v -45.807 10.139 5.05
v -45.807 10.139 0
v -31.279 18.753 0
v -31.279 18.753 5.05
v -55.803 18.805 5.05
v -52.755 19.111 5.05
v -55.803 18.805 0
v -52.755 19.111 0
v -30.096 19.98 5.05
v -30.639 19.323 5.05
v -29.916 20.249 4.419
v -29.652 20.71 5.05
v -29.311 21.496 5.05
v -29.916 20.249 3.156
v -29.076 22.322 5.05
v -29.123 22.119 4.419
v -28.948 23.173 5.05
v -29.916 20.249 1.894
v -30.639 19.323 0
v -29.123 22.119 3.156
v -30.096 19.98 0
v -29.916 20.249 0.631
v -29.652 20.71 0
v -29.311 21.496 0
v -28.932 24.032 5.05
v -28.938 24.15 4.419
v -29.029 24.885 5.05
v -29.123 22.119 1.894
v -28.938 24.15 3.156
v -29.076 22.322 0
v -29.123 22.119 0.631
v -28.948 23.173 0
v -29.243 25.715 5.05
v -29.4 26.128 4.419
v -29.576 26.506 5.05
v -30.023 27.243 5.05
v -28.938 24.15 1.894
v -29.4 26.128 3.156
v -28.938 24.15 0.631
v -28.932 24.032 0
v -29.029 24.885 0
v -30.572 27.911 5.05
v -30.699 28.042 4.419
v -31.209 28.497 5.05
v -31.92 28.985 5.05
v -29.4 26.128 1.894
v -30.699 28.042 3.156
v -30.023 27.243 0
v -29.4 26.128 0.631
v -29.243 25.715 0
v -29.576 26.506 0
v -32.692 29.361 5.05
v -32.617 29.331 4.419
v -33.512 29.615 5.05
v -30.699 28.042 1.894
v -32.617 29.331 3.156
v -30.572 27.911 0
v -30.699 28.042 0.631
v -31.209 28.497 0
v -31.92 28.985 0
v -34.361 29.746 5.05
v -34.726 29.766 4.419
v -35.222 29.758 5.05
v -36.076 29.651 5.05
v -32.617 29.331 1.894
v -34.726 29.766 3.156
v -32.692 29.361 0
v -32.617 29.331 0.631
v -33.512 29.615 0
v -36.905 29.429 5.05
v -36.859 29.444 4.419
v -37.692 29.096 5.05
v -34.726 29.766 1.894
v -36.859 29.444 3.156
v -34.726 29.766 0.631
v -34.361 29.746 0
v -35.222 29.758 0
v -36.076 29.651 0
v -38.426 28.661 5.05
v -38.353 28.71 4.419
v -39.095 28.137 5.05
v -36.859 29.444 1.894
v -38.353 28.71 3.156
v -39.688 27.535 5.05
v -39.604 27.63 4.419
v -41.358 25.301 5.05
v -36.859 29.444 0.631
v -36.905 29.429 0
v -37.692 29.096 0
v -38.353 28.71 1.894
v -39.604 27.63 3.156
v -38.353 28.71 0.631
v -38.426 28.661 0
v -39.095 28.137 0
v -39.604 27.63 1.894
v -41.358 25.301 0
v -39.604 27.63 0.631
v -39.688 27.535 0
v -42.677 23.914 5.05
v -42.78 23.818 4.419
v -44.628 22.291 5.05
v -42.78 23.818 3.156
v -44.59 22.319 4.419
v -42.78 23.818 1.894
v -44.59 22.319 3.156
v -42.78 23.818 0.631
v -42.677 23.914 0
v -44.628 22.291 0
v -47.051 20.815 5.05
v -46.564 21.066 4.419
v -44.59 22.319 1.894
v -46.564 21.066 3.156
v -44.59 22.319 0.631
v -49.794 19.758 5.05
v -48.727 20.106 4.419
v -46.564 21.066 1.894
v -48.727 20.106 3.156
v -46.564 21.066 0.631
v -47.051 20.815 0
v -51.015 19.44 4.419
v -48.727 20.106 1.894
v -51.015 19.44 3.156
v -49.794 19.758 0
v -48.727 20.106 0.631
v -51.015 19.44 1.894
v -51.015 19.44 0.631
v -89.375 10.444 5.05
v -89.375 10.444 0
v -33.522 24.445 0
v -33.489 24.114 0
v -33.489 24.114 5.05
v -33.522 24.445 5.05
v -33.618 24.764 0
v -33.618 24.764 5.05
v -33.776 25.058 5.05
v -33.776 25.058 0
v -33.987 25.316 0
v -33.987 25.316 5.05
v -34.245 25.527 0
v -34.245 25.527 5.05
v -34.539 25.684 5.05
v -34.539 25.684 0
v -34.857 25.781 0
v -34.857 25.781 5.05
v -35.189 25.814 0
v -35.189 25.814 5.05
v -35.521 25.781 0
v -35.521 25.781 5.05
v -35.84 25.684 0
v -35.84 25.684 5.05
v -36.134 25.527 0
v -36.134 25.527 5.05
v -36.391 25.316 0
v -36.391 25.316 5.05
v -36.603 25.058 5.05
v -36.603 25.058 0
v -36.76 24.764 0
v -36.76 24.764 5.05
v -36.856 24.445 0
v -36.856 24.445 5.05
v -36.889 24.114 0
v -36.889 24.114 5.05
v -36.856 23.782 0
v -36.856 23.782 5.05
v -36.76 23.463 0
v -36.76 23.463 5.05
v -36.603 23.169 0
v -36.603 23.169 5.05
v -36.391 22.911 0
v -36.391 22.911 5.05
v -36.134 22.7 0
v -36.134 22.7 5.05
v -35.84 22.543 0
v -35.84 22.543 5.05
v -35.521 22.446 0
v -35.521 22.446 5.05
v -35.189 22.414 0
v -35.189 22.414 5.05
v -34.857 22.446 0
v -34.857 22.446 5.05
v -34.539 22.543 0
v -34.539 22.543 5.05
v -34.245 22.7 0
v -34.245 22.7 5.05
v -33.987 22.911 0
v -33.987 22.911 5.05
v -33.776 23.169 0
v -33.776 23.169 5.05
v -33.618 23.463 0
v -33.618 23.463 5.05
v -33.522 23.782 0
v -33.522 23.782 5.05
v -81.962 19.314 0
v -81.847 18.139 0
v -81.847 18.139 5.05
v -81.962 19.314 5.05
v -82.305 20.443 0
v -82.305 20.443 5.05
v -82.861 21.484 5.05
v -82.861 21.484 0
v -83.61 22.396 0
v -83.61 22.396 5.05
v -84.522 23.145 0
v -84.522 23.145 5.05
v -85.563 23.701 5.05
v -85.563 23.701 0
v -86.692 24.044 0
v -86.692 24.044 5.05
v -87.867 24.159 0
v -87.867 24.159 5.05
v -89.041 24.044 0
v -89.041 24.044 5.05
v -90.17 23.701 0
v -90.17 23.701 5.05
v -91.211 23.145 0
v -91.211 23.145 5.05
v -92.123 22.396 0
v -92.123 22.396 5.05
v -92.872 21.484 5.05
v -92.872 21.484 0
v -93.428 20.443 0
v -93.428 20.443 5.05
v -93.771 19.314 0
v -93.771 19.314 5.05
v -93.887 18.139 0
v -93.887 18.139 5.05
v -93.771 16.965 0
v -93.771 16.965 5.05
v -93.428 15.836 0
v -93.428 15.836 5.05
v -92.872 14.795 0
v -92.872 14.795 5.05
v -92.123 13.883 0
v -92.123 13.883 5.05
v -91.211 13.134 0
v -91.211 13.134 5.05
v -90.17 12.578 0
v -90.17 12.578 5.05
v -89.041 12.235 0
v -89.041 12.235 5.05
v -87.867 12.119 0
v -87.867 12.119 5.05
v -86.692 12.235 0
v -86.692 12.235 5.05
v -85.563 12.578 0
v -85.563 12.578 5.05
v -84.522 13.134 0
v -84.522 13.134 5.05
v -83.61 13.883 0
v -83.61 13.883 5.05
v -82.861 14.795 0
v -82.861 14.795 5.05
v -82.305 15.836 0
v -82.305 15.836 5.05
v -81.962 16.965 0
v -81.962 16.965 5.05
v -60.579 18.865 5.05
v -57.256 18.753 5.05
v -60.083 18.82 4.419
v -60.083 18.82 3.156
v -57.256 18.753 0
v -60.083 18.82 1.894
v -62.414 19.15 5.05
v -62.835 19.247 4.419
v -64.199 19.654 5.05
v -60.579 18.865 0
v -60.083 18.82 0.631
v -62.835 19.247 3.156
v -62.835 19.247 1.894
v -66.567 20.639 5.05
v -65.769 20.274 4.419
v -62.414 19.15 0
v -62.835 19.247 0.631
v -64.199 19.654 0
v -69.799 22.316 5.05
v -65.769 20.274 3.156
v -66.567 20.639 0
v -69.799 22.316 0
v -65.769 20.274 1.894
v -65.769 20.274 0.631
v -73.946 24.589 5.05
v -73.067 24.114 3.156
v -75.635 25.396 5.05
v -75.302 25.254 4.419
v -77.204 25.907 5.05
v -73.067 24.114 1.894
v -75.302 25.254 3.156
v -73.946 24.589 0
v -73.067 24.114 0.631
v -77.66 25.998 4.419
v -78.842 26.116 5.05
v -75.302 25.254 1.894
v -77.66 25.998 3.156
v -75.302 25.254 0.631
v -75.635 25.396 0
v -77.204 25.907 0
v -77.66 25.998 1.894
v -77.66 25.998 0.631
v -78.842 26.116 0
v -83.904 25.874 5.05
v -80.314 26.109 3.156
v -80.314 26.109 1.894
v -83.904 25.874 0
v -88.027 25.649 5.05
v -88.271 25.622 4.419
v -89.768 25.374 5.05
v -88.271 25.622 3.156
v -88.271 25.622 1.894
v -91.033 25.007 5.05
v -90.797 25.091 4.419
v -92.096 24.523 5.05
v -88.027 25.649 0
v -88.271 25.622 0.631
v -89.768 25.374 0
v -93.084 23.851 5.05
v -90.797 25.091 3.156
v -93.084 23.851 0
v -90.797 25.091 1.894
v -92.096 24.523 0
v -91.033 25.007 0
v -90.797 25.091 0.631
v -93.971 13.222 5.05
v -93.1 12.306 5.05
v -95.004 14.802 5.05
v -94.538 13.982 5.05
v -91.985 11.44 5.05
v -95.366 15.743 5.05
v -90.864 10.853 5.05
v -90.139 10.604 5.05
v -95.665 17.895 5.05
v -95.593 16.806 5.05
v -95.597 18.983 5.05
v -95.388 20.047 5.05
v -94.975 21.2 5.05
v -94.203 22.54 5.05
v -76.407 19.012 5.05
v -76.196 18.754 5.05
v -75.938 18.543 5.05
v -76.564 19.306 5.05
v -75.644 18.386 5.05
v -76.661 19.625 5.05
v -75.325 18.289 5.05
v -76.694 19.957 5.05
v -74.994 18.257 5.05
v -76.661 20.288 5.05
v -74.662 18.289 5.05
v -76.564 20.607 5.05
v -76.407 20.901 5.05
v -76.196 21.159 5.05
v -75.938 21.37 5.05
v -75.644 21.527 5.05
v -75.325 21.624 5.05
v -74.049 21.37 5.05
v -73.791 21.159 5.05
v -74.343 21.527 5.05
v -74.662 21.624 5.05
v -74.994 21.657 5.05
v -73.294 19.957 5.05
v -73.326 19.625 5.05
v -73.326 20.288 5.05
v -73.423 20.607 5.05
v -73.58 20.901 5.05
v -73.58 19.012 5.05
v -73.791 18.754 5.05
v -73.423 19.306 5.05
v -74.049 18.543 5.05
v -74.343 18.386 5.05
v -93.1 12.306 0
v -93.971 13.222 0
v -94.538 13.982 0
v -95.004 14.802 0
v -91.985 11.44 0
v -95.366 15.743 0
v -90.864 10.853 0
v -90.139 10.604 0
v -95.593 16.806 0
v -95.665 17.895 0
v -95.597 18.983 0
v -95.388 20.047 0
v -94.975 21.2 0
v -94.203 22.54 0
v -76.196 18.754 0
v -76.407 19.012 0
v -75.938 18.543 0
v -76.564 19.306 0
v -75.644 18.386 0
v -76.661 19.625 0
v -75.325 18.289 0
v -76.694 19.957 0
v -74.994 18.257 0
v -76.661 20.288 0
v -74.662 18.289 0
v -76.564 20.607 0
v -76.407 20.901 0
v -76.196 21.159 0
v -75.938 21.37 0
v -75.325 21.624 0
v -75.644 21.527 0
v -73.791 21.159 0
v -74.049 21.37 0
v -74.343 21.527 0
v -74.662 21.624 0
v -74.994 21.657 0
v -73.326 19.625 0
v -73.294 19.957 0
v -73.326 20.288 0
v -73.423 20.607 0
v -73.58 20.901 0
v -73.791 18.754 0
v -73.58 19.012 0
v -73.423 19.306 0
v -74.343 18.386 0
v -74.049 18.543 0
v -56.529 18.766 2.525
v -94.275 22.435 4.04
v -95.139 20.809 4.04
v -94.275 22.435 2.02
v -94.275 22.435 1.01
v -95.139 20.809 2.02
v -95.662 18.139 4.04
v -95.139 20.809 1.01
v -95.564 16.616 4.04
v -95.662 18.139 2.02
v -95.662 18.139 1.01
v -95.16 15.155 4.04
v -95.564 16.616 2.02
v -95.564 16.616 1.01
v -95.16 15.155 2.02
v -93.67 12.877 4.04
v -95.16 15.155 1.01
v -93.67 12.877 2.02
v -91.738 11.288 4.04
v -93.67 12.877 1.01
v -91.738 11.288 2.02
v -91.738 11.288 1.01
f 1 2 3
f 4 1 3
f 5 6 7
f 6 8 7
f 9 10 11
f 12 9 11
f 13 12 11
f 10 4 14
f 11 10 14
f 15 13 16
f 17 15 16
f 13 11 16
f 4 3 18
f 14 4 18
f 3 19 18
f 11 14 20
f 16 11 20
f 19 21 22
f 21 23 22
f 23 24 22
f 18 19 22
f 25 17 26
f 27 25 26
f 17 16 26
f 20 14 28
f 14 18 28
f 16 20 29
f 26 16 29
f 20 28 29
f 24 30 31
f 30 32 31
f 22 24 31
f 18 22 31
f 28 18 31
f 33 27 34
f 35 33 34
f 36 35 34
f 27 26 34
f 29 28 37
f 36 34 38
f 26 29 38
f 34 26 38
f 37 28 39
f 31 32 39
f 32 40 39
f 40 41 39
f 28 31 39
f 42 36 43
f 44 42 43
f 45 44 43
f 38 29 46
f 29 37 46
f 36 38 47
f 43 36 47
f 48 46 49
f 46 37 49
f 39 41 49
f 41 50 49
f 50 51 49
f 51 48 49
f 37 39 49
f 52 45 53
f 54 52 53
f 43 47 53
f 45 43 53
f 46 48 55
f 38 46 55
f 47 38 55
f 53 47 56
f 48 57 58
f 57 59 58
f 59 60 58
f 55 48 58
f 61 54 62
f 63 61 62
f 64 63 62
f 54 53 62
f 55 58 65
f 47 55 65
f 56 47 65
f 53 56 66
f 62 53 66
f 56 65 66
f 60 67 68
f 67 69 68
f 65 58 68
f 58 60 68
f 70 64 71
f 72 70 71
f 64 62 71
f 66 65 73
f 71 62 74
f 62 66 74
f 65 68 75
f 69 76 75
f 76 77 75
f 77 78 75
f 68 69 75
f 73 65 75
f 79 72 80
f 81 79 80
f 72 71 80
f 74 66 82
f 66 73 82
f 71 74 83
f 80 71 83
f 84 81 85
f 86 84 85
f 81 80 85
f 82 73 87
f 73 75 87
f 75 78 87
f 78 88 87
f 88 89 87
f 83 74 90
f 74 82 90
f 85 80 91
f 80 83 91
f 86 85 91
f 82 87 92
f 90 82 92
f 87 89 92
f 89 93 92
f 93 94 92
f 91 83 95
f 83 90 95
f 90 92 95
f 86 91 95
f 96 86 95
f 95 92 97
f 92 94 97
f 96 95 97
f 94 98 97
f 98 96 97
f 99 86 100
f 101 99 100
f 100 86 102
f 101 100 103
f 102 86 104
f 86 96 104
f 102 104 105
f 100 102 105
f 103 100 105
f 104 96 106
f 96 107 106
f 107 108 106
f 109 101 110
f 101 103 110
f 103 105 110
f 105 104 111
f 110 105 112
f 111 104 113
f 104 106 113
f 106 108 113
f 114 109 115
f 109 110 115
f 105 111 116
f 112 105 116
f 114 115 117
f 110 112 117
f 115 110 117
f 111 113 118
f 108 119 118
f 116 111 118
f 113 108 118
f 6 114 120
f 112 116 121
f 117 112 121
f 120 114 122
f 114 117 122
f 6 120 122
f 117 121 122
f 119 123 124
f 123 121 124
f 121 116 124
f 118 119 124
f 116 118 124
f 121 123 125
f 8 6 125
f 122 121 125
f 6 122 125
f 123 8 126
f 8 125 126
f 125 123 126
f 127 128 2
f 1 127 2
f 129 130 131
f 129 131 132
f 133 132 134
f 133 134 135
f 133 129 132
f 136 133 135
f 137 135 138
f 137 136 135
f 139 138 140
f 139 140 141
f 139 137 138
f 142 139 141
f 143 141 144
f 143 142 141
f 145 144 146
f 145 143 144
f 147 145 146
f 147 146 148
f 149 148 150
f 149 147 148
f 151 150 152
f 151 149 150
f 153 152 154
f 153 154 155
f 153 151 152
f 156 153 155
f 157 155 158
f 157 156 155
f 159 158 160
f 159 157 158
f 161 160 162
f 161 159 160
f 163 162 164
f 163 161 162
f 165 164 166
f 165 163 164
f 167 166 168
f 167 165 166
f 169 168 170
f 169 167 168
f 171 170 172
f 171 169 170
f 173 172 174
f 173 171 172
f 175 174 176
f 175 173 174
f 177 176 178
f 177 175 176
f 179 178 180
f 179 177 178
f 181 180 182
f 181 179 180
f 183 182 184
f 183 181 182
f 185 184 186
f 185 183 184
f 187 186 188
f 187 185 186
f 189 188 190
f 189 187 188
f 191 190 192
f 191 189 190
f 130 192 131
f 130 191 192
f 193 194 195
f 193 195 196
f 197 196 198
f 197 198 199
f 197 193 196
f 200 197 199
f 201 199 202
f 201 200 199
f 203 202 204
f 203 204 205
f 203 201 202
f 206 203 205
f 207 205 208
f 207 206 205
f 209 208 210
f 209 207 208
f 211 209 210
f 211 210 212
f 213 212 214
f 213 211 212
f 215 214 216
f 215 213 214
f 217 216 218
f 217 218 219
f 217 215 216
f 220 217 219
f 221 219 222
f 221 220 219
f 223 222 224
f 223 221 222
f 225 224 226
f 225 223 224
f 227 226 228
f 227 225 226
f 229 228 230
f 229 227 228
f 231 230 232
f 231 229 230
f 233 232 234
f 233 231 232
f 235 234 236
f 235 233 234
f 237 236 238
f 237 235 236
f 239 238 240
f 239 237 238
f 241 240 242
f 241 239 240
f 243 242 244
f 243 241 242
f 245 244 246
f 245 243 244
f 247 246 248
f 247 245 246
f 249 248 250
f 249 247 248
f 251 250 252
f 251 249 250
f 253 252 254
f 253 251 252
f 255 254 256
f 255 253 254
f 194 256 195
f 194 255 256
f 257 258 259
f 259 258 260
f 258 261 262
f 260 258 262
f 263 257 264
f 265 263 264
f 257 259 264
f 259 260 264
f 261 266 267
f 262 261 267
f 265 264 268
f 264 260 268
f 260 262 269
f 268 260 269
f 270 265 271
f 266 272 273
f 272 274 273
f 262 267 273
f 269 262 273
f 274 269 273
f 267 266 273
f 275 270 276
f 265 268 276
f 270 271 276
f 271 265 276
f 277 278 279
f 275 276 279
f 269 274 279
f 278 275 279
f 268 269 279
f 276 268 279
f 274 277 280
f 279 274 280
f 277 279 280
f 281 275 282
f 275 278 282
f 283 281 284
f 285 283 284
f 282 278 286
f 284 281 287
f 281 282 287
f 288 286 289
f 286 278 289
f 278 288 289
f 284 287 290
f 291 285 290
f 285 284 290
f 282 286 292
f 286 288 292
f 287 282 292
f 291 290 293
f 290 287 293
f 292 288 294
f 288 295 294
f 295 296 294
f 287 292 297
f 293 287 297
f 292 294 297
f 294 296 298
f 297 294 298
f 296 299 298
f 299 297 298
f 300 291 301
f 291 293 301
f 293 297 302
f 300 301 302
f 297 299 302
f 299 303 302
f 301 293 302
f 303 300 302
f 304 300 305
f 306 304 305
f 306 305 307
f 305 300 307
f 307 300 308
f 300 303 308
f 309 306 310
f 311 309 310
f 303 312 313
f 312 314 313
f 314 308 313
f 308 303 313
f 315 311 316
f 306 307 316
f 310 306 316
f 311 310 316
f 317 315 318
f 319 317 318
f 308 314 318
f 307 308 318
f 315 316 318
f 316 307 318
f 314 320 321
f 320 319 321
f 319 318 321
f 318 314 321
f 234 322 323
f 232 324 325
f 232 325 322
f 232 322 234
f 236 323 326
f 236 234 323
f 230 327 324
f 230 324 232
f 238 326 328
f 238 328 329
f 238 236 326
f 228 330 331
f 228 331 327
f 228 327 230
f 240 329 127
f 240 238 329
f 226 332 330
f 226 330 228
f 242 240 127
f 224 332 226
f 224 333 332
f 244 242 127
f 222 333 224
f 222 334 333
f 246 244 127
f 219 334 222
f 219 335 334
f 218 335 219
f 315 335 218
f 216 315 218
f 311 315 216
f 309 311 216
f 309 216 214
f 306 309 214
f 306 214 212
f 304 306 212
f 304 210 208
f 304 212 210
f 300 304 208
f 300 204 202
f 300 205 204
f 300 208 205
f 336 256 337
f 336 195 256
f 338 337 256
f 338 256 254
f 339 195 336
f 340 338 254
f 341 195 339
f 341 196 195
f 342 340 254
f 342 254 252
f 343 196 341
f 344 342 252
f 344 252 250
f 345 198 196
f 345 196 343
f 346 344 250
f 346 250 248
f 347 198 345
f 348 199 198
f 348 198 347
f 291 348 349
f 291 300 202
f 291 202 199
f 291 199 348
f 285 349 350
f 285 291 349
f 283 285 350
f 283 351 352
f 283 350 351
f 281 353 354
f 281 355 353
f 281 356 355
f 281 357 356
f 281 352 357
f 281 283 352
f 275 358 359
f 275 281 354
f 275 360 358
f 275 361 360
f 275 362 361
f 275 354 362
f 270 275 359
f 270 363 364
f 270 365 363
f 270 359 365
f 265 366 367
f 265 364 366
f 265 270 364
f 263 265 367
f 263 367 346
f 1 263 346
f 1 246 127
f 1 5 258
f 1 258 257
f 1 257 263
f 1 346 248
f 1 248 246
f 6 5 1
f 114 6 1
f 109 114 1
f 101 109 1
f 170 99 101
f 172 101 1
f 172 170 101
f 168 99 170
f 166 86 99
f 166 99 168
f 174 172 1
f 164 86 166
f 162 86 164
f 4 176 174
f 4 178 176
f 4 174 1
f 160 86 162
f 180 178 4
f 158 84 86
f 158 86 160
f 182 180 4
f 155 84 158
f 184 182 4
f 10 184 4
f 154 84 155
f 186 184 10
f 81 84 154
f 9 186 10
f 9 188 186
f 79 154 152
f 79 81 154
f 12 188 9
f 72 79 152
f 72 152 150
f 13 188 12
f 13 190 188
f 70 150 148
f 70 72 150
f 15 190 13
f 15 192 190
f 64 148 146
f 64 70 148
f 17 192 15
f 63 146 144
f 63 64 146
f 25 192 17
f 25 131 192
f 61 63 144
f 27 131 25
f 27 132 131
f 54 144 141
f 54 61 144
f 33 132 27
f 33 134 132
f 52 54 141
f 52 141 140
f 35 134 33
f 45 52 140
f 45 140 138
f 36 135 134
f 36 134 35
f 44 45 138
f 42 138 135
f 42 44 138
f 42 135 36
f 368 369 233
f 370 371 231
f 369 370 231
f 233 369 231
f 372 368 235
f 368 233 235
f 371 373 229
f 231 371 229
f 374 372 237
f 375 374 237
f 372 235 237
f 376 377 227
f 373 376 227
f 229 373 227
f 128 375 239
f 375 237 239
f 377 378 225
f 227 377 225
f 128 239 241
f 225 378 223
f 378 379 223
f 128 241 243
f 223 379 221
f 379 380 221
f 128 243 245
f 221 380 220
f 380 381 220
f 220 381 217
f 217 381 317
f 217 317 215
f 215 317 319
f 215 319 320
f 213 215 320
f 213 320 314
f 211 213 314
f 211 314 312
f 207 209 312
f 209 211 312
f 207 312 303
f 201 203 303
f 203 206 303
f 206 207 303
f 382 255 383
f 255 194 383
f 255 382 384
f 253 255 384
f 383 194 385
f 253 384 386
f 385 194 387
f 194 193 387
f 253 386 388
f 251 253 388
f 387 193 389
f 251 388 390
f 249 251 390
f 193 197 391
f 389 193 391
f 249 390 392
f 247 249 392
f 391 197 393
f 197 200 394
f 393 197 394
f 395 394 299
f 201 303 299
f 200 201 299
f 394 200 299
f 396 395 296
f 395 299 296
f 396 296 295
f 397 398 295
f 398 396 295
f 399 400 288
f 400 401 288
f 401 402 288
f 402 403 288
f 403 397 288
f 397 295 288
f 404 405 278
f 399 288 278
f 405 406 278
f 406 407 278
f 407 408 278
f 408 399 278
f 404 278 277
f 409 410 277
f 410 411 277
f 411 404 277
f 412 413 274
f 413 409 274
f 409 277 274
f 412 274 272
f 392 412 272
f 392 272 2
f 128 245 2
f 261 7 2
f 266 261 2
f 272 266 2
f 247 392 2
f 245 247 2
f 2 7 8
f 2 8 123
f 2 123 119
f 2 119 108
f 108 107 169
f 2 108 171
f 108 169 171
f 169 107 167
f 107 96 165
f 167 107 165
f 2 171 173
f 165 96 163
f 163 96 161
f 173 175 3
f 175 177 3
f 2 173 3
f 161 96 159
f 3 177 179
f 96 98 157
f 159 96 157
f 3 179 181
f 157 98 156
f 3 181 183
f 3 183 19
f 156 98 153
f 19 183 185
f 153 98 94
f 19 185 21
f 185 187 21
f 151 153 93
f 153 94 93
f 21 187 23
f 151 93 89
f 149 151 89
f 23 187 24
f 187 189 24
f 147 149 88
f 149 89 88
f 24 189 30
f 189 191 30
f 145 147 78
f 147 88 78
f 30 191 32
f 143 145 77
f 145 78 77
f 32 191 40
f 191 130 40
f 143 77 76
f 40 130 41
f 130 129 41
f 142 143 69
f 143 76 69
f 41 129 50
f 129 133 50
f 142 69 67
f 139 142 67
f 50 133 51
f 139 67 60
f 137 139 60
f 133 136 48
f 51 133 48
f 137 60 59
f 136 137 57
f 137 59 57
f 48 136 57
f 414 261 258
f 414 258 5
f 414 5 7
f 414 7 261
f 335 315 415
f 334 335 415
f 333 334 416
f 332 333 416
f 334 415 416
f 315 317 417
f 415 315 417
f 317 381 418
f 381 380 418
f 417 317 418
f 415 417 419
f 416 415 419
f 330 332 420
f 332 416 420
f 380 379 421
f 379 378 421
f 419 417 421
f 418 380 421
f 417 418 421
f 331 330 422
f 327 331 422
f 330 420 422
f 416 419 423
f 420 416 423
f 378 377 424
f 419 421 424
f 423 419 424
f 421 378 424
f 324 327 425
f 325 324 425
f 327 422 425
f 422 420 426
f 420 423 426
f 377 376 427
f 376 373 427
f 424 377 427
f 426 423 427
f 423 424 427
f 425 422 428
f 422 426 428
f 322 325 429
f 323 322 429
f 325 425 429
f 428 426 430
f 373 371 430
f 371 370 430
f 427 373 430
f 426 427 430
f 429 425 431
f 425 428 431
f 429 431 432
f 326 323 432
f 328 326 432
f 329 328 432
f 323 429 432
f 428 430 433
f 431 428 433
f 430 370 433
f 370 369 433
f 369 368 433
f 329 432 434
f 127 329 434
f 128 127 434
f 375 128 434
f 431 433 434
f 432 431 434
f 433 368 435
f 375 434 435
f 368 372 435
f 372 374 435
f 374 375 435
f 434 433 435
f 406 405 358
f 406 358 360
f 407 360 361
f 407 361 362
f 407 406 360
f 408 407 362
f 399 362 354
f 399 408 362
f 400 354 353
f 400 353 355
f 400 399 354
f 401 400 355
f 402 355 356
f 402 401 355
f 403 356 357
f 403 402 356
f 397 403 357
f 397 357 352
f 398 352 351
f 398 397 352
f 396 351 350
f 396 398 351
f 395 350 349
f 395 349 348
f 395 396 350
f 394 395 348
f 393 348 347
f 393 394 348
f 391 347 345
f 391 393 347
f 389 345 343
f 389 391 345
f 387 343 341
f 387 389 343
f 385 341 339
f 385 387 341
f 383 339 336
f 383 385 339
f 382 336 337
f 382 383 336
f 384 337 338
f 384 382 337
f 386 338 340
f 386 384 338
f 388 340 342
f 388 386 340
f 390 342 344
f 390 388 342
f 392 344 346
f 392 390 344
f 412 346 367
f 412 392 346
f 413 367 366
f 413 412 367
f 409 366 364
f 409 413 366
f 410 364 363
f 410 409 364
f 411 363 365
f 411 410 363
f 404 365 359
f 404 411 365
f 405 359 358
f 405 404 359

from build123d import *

# Parameters (mm, degrees)
SCHIZZO2_R                   = 6.02
SCHIZZO2_R_2                 = 1.7
ESTRUSIONE_ESTRUSIONE1_DEPTH = 5.05


with BuildPart() as part:
    # Schizzo2 → Estrusione-Estrusione1 (new body)
    with BuildSketch(Plane.XY):
        with BuildLine():
            Line((-89.374898214, 10.44391596), (-45.806517375, 10.138527109))
            Line((-45.806517375, 10.138527109), (-31.279343931, 18.753125585))
            add(Edge.make_bspline(
                [(-31.279343931, 18.753125585), (-29.098043345, 20.403651058), (-27.905057256, 25.441624833), (-32.300384053, 29.85841163), (-36.690541673, 29.918863446), (-39.614892883, 27.942376602), (-41.03245157, 25.552100431), (-43.284640457, 23.241638673), (-47.763557065, 19.862154048), (-52.57074608, 18.979169365), (-55.803154975, 18.8049533)],
                knots=[0, 0, 0, 0, 0.102244465, 0.160154236, 0.214292787, 0.256272844, 0.289149591, 0.319658417, 0.379342086, 0.500706378, 0.500706378, 0.500706378, 0.500706378], degree=3))
            add(Edge.make_bspline(
                [(-57.25626525, 18.753125585), (-56.52869344, 18.753125585), (-55.803154975, 18.8049533)],
                knots=[4.71238898, 4.71238898, 4.71238898, 4.787168695, 4.787168695, 4.787168695], degree=2, weights=[1, 0.999301081, 1]))
            add(Edge.make_bspline(
                [(-57.25626525, 18.753125585), (-59.155150134, 18.717879159), (-63.127762505, 18.895973961), (-68.30110331, 21.45743798), (-72.985617709, 24.08656858), (-76.315266746, 25.875128424), (-79.739526403, 26.236715977), (-83.278928702, 25.795001813), (-88.238817678, 25.8484339), (-91.689171987, 24.998953947), (-93.083744843, 23.851210505)],
                knots=[0.518902231, 0.518902231, 0.518902231, 0.518902231, 0.590344576, 0.669858142, 0.735080639, 0.798411316, 0.810363017, 0.866325434, 0.934003559, 1, 1, 1, 1], degree=3))
            add(Edge.make_bspline(
                [(-93.083744843, 23.851210505), (-93.963586918, 22.989018523), (-95.239548576, 21.18289576), (-95.824246169, 18.047120823), (-95.406173905, 15.162358675), (-93.315245164, 12.148204862), (-91.089335339, 10.692555949), (-89.374898214, 10.44391596)],
                knots=[0.80240839, 0.80240839, 0.80240839, 0.80240839, 0.844688232, 0.876032892, 0.910905343, 0.942275004, 1, 1, 1, 1], degree=3))
        make_face()
        with Locations((-87.866678473, 18.139302594)):
            Circle(SCHIZZO2_R, mode=Mode.SUBTRACT)
        with Locations((-74.993560801, 19.956508848)):
            Circle(SCHIZZO2_R_2, mode=Mode.SUBTRACT)
        with Locations((-35.18906777, 24.113568479)):
            Circle(SCHIZZO2_R_2, mode=Mode.SUBTRACT)
    extrude(amount=ESTRUSIONE_ESTRUSIONE1_DEPTH)


solid = part.part
